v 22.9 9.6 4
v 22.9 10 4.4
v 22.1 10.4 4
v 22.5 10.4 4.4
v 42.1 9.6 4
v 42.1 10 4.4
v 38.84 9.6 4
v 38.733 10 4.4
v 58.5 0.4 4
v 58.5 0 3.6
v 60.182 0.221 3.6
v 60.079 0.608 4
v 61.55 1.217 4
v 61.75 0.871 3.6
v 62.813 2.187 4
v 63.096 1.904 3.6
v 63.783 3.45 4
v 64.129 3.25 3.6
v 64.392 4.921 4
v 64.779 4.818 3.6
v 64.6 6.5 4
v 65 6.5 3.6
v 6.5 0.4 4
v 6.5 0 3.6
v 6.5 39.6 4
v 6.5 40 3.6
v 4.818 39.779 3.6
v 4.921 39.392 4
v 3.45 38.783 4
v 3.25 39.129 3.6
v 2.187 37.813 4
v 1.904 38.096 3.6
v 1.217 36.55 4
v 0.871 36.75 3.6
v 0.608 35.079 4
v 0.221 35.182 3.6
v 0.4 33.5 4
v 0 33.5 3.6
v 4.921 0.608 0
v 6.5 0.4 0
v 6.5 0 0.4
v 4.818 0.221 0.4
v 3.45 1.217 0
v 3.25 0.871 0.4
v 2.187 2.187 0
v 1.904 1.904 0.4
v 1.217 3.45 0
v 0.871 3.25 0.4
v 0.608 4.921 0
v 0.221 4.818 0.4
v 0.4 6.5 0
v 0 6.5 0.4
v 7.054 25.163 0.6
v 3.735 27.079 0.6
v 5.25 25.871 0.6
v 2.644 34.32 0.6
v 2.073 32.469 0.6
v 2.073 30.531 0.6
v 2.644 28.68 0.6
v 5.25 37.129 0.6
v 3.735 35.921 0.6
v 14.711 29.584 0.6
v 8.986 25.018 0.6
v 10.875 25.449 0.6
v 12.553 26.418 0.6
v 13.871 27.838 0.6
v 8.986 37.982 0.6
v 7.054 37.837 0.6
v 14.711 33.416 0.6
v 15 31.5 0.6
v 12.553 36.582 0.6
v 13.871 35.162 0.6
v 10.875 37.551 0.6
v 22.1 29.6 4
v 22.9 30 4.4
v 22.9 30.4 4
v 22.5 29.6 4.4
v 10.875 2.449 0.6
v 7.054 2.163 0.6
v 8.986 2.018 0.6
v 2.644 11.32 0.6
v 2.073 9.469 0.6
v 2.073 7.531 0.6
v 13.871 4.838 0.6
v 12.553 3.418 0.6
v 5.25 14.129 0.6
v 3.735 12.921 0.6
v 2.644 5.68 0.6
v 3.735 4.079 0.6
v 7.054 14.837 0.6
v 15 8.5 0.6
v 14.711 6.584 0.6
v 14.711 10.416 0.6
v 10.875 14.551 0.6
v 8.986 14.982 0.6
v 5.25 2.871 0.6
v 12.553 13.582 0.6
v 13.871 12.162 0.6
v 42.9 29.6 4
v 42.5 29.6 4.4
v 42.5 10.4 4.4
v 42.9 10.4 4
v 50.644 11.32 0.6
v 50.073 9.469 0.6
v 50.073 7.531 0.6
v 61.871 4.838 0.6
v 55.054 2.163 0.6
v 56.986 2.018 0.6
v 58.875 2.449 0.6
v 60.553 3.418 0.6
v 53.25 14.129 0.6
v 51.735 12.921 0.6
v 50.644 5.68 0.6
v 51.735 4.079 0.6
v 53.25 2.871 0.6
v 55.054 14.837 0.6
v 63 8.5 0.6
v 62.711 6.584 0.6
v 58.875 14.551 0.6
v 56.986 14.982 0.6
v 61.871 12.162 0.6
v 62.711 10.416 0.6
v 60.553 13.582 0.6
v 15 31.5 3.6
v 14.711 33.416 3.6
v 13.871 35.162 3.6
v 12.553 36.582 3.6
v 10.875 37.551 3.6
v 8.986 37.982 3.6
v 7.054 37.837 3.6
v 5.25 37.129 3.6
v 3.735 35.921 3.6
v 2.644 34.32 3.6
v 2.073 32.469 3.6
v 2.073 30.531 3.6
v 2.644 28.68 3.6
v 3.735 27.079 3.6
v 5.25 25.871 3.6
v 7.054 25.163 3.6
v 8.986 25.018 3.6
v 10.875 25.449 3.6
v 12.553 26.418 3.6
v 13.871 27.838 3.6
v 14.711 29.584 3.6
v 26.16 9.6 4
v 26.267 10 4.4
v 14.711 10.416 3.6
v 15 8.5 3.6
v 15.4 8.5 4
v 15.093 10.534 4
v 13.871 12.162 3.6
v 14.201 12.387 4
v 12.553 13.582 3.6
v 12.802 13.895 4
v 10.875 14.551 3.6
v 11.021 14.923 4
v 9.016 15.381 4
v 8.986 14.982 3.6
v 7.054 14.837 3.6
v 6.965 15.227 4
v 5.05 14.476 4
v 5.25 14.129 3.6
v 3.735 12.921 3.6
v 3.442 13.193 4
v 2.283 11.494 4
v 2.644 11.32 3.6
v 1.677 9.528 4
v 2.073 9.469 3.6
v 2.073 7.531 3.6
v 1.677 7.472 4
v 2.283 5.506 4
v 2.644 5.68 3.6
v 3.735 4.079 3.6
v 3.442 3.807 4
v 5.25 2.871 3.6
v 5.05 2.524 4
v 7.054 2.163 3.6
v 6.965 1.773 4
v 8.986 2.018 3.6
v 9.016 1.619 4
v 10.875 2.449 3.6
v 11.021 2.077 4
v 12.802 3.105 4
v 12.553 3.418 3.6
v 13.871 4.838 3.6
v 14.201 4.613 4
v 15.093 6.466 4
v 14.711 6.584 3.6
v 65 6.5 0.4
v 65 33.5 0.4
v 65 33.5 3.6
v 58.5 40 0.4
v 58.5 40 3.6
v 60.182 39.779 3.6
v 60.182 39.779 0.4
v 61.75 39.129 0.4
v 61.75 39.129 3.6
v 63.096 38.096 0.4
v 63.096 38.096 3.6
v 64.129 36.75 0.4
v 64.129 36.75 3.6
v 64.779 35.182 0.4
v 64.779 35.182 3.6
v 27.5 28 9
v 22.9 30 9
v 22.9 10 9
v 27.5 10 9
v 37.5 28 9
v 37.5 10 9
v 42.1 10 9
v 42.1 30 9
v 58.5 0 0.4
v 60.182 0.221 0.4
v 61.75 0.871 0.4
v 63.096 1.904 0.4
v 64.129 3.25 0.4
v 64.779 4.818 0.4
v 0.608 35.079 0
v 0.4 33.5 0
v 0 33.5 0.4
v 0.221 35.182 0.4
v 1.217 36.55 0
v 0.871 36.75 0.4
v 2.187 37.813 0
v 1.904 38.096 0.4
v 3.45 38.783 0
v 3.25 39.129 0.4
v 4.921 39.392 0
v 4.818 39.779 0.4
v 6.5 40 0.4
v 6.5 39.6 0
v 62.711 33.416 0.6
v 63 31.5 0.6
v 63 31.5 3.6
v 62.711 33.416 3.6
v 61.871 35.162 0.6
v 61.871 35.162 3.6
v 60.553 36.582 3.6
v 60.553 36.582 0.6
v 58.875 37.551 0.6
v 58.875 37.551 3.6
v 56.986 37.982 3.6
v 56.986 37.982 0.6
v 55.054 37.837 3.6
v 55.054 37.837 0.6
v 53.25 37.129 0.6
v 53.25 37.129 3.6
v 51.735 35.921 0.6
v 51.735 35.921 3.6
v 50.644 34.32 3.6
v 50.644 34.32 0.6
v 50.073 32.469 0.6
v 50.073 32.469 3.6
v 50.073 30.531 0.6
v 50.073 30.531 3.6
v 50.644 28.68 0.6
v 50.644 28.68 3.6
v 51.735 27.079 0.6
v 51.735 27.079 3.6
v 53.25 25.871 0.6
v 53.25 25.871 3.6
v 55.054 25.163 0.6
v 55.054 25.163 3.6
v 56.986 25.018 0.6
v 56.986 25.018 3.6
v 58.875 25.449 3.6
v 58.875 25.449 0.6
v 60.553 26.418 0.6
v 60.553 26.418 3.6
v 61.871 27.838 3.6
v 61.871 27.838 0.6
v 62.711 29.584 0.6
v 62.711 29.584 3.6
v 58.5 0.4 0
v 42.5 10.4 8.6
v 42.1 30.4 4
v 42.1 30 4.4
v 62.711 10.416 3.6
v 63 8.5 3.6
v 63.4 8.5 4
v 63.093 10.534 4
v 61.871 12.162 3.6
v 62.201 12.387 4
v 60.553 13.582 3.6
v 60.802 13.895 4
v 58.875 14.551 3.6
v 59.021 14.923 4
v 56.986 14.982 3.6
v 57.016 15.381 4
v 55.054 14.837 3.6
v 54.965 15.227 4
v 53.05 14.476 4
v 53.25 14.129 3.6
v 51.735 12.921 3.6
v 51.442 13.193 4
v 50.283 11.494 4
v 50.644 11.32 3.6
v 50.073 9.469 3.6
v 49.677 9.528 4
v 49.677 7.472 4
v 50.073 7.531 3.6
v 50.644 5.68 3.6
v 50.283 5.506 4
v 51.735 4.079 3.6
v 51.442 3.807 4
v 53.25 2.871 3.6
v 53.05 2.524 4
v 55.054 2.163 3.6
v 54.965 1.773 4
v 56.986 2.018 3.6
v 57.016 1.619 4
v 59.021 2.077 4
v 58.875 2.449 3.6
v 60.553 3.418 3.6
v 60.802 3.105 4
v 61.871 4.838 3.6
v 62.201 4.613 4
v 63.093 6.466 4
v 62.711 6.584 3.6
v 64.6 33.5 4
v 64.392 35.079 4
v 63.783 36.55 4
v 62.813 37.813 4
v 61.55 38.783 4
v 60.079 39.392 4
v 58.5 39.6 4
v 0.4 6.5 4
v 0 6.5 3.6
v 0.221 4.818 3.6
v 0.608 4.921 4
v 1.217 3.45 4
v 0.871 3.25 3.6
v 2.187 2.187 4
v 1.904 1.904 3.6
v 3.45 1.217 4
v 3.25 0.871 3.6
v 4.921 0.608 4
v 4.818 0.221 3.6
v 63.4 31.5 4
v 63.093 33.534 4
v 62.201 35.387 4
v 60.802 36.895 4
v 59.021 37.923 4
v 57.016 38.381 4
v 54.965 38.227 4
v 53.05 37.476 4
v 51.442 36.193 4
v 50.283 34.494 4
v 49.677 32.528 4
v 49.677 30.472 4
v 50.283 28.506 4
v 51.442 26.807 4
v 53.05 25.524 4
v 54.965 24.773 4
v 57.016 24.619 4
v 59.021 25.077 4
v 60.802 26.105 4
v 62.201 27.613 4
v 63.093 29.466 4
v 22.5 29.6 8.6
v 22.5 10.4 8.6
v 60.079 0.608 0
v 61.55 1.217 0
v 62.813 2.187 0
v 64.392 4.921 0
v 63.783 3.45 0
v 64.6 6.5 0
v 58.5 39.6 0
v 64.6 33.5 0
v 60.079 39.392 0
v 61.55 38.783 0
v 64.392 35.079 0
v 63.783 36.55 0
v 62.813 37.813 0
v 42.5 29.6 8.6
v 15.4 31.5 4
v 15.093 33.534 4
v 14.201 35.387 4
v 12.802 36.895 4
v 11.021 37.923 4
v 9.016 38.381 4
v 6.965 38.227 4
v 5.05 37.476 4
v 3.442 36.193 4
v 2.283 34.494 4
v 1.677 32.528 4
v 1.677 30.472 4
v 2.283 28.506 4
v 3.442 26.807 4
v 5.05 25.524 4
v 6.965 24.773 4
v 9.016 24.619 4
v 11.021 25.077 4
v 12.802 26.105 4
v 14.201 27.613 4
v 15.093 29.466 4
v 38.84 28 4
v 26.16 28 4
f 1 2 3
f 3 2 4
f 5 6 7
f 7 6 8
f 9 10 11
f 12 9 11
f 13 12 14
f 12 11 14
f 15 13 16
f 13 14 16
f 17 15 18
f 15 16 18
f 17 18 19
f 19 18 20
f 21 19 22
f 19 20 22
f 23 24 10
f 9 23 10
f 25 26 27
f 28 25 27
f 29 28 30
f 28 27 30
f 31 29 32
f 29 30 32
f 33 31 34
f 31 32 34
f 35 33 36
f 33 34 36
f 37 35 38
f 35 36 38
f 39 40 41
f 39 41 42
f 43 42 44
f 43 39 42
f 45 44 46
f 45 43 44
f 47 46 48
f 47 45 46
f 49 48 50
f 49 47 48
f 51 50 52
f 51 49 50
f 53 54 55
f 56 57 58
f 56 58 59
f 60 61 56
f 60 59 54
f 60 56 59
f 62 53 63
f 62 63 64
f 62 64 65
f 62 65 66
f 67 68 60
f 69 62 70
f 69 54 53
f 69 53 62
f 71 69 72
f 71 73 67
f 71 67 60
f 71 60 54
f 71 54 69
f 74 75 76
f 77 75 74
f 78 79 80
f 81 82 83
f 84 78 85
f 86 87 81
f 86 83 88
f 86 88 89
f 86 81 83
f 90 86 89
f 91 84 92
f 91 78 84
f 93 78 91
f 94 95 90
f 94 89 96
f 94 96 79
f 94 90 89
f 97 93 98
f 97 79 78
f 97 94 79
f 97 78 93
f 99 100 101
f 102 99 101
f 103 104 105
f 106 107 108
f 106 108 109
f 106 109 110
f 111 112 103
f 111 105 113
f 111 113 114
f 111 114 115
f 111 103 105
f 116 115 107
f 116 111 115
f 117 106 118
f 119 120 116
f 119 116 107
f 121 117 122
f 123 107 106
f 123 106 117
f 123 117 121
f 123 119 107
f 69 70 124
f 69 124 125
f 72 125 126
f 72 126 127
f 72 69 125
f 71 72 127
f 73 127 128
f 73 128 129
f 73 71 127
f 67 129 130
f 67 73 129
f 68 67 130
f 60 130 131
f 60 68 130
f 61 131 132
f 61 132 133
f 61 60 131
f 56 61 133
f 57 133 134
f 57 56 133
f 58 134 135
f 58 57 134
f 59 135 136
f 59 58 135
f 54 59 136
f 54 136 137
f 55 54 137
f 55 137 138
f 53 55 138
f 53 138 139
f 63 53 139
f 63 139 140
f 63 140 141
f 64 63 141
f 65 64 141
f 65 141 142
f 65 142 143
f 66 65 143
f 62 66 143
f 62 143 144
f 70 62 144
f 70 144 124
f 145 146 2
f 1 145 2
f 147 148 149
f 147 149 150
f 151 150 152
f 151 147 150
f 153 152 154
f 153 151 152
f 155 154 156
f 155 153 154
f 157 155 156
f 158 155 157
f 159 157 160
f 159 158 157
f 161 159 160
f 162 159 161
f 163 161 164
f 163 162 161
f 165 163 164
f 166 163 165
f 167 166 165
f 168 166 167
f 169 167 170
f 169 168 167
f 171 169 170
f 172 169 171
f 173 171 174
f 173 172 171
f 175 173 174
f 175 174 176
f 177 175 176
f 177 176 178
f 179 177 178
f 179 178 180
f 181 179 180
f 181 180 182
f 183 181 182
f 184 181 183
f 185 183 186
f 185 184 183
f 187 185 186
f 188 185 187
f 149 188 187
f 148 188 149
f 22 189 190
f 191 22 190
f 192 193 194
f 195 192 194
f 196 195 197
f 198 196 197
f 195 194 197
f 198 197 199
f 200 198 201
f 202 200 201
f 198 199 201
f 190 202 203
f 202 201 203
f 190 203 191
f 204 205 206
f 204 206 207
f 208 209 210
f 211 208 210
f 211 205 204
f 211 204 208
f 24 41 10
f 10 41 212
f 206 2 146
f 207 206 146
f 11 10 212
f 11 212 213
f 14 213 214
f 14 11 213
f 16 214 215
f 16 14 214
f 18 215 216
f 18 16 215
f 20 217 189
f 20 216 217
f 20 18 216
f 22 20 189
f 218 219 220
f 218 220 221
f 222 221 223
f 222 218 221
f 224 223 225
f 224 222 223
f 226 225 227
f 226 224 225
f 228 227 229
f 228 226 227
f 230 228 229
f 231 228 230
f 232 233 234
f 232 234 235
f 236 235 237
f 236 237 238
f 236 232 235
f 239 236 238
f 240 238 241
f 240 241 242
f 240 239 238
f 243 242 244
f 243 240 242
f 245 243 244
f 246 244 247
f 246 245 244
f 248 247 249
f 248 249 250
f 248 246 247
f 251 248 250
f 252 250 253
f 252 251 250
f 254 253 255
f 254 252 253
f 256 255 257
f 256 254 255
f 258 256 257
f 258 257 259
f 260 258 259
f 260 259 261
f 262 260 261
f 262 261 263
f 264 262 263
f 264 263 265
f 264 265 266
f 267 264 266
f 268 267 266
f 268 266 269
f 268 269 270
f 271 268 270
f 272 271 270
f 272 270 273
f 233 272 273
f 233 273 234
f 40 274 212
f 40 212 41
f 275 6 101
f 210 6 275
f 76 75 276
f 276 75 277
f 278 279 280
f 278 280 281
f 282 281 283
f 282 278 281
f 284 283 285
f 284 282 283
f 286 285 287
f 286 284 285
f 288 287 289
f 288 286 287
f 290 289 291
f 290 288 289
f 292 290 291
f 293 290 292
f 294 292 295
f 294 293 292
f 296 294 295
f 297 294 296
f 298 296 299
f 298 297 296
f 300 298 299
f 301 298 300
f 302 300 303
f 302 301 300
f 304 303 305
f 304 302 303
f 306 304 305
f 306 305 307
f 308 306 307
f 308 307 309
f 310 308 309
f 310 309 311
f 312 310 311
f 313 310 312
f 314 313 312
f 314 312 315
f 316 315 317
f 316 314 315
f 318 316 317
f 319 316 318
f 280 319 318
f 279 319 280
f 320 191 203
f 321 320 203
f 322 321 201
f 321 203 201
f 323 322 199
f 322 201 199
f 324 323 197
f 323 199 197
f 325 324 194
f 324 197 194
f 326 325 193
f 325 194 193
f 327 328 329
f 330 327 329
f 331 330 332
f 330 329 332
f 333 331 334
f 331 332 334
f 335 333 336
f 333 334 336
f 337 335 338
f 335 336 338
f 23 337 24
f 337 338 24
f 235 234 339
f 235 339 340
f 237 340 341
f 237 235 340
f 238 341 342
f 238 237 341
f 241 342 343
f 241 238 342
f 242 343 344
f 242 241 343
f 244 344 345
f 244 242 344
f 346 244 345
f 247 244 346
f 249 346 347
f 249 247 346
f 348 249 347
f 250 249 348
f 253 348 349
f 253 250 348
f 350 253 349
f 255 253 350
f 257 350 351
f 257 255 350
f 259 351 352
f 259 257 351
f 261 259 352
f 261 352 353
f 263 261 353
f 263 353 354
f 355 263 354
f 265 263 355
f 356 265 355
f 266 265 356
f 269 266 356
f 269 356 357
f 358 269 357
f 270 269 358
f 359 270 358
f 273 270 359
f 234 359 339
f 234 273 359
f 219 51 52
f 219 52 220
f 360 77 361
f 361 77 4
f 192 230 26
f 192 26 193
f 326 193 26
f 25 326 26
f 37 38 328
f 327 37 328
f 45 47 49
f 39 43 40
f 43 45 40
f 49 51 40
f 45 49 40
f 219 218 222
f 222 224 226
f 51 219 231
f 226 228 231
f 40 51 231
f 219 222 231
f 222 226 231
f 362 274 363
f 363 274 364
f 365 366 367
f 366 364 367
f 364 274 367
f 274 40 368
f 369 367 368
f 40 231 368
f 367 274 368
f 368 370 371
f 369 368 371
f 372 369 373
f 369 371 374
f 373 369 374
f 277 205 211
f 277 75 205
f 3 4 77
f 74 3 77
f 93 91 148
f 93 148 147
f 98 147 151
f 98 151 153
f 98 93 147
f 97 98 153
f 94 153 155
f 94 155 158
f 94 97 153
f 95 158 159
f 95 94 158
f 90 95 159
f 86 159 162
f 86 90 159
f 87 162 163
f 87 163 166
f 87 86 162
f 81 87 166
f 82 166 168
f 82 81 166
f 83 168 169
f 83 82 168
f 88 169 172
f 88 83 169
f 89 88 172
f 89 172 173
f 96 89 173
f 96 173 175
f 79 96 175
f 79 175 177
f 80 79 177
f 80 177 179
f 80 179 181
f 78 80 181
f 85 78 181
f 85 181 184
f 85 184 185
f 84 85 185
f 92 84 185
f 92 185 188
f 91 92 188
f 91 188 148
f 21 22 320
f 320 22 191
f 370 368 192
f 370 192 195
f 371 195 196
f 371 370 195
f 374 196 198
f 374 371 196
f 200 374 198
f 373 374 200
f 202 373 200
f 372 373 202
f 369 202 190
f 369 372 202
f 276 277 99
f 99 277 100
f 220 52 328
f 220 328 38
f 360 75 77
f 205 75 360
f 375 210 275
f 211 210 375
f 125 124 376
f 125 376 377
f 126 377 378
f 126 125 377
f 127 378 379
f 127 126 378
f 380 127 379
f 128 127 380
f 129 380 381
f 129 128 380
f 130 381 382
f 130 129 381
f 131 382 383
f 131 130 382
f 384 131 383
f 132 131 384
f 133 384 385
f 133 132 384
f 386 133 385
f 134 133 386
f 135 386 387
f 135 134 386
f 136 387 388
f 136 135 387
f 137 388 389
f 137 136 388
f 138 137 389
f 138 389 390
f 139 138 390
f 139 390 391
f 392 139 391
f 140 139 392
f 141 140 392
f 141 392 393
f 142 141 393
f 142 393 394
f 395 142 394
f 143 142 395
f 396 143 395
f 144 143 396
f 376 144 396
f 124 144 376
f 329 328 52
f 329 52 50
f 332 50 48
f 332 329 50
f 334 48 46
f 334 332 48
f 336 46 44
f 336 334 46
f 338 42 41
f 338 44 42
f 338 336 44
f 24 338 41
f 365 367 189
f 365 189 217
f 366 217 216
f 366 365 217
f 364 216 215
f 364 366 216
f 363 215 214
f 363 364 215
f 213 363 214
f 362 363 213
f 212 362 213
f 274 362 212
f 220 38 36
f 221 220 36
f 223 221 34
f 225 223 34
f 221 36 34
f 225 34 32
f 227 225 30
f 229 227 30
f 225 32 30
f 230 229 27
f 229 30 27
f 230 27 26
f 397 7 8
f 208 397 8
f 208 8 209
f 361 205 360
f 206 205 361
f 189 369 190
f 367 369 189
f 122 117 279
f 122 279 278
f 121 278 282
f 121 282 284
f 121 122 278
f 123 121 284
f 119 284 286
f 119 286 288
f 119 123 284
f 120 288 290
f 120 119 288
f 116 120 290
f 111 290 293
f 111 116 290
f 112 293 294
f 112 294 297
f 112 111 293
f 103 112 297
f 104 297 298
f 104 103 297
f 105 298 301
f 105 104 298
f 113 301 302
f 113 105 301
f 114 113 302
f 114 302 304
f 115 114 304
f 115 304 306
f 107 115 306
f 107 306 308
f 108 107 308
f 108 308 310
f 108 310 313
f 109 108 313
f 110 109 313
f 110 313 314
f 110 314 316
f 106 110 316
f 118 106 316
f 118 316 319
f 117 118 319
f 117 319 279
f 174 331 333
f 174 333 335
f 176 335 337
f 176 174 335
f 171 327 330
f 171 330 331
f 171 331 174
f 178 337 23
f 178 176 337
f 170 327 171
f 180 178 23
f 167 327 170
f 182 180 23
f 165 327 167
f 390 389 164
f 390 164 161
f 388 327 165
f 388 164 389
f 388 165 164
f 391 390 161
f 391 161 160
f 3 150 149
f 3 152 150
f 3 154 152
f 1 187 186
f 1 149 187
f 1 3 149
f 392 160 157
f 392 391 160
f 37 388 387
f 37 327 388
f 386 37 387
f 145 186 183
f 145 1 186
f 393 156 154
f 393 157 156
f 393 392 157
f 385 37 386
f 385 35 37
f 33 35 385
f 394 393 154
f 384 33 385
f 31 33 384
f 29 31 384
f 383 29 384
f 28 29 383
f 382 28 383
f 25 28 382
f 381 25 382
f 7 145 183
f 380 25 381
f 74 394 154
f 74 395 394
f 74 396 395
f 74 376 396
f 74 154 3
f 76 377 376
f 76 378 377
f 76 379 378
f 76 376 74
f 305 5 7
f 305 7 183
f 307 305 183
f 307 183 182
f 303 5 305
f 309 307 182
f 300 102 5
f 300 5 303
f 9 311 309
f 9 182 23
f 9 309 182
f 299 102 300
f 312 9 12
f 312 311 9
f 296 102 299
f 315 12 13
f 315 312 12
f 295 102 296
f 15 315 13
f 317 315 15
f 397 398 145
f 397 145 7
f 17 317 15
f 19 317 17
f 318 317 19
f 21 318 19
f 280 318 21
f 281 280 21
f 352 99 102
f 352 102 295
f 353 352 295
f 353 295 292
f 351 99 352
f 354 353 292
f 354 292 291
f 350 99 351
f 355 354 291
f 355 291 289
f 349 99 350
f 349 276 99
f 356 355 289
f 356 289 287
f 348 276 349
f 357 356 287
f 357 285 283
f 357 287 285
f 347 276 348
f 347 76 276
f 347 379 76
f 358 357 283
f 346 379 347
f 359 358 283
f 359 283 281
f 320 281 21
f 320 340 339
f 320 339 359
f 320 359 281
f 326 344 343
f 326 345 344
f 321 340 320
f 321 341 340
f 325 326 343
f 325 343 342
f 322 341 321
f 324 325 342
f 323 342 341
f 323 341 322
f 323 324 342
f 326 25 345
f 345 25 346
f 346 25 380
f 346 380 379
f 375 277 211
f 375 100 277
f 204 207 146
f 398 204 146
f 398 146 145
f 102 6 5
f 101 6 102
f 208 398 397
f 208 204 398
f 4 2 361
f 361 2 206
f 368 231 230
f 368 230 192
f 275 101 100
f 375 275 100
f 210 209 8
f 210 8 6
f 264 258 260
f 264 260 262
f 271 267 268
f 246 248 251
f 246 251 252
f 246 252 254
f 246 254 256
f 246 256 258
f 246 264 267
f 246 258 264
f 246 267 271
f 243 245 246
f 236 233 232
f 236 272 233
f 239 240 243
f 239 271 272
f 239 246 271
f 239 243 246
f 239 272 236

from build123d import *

# Parameters (mm, degrees)
F6_W      = 65
F6_H      = 40
F6_R      = 6.5
F7_DEPTH  = 4
F8_DEPTH  = 0.6
F6_W_2    = 20
F6_H_2    = 18
F6_H_3    = 2
F9_DEPTH  = 9
F11_DEPTH = 18
F12_R     = 6.5
F13_SIZE  = 0.4


with BuildPart() as f7:
    # F6 (on Top) → F7 (new body)
    with BuildSketch(Plane.XY):
        with Locations((32.5, 20)):
            Rectangle(F6_W, F6_H)
        with Locations((8.5, 8.5)):
            Circle(F6_R, mode=Mode.SUBTRACT)
        with Locations((56.5, 8.5)):
            Circle(F6_R, mode=Mode.SUBTRACT)
        with Locations((8.5, 31.5)):
            Circle(F6_R, mode=Mode.SUBTRACT)
        Polygon((22.5, 30), (42.5, 30), (42.5, 28), (42.5, 10), (22.5, 10), (22.5, 28), align=None, mode=Mode.SUBTRACT)
        with Locations((56.5, 31.5)):
            Circle(F6_R, mode=Mode.SUBTRACT)
    extrude(amount=F7_DEPTH)

    # F6 (on Top) → F8 (join)
    with BuildSketch(Plane.XY):
        with Locations((8.5, 31.5)):
            Circle(F6_R)
        with Locations((8.5, 8.5)):
            Circle(F6_R)
        with Locations((56.5, 8.5)):
            Circle(F6_R)
        with Locations((56.5, 31.5)):
            Circle(F6_R)
    extrude(amount=F8_DEPTH)

    # F6 (on Top) → F9 (join)
    with BuildSketch(Plane.XY):
        with Locations((32.5, 19)):
            Rectangle(F6_W_2, F6_H_2)
        with Locations((32.5, 29)):
            Rectangle(F6_W_2, F6_H_3)
    extrude(amount=F9_DEPTH)

    # F10 (on face) → F11 (cut)
    with BuildSketch(Plane.XZ.offset(-10)):
        Polygon((26.1602540378, 4), (38.8397459622, 4), (37.5, 9), (27.5, 9), align=None)
    extrude(amount=-F11_DEPTH, mode=Mode.SUBTRACT)

    # F12
    f12_edges = [f7.edges().sort_by_distance(p)[0] for p in [
        (0, 0, 2),
        (0, 40, 2),
        (65, 0, 2),
        (65, 40, 2),
    ]]
    fillet(f12_edges, radius=F12_R)

    # F13
    f13_edges = [f7.edges().sort_by_distance(p)[0] for p in [
        (0, 20, 0),
        (1.903806, 38.096194, 0),
        (1.903806, 1.903806, 0),
        (32.5, 40, 0),
        (32.5, 0, 0),
        (63.096194, 38.096194, 0),
        (63.096194, 1.903806, 0),
        (65, 20, 0),
        (22.5, 20, 4),
        (22.5, 10, 6.5),
        (22.5, 20, 9),
        (22.5, 30, 6.5),
        (42.5, 20, 4),
        (42.5, 30, 6.5),
        (42.5, 20, 9),
        (42.5, 10, 6.5),
        (50, 8.5, 4),
        (50, 31.5, 4),
        (2, 8.5, 4),
        (2, 31.5, 4),
        (32.5, 0, 4),
        (0, 20, 4),
        (1.903806, 38.096194, 4),
        (1.903806, 1.903806, 4),
        (32.5, 40, 4),
        (63.096194, 38.096194, 4),
        (63.096194, 1.903806, 4),
        (65, 20, 4),
        (32.5, 30, 4),
        (40.669873, 10, 4),
        (24.330127, 10, 4),
    ]]
    chamfer(f13_edges, length=F13_SIZE)


solid = f7.part
